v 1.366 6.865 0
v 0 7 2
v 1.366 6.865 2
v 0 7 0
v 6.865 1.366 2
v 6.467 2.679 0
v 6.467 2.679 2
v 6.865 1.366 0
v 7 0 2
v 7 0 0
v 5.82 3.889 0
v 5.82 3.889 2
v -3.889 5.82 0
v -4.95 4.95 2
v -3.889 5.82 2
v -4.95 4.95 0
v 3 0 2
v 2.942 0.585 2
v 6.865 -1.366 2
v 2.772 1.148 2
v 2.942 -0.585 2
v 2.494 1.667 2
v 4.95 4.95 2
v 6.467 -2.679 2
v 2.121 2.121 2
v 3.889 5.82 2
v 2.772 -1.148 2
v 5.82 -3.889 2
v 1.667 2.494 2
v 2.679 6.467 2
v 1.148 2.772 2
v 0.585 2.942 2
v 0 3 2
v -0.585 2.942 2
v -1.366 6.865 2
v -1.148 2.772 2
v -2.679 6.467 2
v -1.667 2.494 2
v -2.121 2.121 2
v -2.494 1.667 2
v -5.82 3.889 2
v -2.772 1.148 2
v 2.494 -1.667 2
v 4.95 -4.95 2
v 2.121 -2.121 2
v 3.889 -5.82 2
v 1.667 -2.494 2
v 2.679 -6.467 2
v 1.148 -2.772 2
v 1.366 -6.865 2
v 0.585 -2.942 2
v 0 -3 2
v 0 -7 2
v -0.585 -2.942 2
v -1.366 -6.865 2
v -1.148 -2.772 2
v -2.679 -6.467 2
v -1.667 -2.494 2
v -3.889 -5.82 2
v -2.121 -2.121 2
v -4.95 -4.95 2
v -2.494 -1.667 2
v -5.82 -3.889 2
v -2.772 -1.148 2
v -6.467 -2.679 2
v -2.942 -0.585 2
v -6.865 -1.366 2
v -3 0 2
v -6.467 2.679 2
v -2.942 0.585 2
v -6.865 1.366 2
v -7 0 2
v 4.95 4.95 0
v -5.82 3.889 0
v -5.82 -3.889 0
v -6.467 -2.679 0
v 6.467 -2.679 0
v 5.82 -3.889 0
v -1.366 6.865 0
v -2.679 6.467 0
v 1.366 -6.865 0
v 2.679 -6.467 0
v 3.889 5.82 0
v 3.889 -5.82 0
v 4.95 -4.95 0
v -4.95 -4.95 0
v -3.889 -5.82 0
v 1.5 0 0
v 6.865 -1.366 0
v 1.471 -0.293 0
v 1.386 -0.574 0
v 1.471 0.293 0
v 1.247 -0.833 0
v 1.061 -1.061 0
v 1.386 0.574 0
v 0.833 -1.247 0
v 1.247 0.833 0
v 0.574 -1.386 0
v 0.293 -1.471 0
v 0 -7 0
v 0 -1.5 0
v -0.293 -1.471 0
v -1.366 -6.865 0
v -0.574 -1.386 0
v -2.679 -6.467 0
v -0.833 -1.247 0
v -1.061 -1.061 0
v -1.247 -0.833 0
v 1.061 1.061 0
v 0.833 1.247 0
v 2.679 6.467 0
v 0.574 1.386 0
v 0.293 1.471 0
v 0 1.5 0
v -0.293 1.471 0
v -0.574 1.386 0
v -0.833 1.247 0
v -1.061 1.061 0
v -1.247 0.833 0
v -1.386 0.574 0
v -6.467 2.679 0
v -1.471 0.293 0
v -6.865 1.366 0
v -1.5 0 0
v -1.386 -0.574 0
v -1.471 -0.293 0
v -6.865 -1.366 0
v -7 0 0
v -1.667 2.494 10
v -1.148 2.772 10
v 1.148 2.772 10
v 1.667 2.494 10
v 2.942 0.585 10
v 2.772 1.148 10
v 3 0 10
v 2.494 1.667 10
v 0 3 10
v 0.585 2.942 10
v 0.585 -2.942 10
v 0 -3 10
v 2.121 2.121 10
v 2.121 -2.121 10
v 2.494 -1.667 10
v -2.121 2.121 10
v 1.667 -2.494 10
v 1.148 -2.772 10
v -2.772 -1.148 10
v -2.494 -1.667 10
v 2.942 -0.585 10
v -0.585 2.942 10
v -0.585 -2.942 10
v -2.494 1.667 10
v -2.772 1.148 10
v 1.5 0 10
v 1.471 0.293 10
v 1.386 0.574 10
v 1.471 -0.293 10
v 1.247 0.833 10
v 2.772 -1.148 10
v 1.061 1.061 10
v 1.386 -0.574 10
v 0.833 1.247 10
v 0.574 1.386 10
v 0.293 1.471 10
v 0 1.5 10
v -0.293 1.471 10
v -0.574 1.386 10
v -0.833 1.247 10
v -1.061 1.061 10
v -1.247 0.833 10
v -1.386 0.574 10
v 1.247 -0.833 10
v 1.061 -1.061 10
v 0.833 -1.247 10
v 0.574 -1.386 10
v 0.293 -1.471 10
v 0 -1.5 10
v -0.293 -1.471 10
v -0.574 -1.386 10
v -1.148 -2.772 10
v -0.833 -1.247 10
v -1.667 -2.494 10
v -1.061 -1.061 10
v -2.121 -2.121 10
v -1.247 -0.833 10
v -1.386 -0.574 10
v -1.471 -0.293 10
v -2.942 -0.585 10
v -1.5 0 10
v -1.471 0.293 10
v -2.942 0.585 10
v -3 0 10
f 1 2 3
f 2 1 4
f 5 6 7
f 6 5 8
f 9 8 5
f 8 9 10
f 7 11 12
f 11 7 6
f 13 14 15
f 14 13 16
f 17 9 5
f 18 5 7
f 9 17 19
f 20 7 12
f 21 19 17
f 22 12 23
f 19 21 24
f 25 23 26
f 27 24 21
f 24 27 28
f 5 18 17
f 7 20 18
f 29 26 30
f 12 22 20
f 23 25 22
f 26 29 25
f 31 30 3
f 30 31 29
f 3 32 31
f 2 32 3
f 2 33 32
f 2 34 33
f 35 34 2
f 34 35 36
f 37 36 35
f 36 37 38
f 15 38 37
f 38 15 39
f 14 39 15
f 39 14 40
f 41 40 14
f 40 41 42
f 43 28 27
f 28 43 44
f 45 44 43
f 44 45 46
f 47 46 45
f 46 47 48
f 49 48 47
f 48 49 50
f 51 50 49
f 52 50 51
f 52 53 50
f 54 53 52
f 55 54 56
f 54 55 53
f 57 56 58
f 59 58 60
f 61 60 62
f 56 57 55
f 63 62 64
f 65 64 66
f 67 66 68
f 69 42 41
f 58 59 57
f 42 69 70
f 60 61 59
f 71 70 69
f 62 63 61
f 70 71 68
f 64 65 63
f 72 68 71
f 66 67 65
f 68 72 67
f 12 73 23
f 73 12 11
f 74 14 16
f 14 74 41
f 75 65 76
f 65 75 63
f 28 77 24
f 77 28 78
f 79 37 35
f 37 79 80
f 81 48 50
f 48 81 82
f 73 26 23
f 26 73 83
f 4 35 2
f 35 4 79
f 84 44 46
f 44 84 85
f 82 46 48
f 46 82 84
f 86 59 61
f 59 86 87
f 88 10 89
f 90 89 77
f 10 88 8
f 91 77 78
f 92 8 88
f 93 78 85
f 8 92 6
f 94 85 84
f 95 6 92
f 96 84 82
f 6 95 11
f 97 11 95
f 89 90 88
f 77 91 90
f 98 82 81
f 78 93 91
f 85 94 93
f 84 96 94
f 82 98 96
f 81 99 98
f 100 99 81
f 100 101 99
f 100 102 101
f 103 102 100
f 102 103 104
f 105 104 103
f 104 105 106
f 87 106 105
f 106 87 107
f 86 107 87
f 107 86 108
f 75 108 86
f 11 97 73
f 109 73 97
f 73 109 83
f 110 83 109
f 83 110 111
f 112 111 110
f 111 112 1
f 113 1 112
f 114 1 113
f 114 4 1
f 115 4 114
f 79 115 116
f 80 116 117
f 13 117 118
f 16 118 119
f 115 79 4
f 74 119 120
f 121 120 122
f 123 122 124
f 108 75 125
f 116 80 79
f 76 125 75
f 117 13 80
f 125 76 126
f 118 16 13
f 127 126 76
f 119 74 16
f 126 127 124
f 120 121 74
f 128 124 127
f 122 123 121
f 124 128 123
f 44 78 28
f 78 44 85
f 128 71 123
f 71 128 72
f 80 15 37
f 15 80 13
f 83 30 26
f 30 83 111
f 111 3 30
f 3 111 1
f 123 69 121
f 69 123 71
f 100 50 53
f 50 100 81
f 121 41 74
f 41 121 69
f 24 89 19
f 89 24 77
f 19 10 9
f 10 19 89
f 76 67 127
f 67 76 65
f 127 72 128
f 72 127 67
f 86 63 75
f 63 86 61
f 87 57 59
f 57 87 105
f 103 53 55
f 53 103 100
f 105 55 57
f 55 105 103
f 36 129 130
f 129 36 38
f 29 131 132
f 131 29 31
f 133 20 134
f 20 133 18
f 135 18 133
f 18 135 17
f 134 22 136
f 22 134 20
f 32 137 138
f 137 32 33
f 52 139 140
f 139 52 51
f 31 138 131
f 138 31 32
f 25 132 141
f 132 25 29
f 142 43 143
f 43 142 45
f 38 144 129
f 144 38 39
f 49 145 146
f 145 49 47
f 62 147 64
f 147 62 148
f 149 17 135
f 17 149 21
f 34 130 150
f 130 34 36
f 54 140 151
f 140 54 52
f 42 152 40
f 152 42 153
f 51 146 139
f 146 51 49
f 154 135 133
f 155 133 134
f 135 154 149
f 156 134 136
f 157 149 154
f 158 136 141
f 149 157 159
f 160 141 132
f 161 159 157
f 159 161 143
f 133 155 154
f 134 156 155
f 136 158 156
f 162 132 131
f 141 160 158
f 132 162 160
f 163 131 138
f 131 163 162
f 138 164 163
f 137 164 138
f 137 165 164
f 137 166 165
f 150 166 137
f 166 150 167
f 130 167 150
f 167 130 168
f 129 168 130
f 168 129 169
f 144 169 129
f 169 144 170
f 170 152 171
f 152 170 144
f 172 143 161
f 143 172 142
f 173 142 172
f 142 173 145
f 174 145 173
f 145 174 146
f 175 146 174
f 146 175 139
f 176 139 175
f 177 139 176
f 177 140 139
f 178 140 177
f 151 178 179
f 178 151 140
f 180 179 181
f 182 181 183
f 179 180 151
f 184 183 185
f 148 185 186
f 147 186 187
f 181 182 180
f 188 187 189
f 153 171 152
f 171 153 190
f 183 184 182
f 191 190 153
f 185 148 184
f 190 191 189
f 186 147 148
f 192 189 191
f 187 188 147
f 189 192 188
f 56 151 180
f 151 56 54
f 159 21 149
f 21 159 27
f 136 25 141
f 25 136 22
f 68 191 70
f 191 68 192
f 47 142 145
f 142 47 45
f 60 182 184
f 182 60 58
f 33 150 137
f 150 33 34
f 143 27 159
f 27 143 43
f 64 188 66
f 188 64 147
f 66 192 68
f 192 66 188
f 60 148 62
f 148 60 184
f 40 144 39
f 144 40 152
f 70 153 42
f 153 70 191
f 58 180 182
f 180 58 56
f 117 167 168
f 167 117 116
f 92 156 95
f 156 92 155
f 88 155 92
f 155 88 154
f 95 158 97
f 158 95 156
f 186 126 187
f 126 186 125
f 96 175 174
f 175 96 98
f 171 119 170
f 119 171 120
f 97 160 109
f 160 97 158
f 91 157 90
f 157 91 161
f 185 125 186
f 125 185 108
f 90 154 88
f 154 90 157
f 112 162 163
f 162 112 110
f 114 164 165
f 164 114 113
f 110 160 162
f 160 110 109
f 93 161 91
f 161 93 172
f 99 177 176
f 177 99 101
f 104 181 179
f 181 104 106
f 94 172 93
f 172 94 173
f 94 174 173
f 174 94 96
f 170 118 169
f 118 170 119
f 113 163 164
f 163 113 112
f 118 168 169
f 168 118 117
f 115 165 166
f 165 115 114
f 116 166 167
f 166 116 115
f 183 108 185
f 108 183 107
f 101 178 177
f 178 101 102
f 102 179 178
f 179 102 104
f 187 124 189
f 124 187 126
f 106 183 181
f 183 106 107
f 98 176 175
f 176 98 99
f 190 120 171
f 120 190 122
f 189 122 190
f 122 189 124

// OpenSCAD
$fn = 32;

// ----------------------------------------------------------------------
// Micro post: flanged post, 5-20 mm class
// ----------------------------------------------------------------------

// --- parameters (mm) ---
post_d = 6;               // post diameter
post_h = 8;               // post height above the flange
flange_d = 14;            // flange diameter
flange_t = 2;             // flange thickness
bore_d = 3;               // through bore

total_h = post_h + flange_t;  // overall height

difference() {
  union() {
    cylinder(h = flange_t, d = flange_d);
    translate([0, 0, flange_t]) cylinder(h = post_h, d = post_d);
  }
  translate([0, 0, -1]) cylinder(h = total_h + 2, d = bore_d);
}
